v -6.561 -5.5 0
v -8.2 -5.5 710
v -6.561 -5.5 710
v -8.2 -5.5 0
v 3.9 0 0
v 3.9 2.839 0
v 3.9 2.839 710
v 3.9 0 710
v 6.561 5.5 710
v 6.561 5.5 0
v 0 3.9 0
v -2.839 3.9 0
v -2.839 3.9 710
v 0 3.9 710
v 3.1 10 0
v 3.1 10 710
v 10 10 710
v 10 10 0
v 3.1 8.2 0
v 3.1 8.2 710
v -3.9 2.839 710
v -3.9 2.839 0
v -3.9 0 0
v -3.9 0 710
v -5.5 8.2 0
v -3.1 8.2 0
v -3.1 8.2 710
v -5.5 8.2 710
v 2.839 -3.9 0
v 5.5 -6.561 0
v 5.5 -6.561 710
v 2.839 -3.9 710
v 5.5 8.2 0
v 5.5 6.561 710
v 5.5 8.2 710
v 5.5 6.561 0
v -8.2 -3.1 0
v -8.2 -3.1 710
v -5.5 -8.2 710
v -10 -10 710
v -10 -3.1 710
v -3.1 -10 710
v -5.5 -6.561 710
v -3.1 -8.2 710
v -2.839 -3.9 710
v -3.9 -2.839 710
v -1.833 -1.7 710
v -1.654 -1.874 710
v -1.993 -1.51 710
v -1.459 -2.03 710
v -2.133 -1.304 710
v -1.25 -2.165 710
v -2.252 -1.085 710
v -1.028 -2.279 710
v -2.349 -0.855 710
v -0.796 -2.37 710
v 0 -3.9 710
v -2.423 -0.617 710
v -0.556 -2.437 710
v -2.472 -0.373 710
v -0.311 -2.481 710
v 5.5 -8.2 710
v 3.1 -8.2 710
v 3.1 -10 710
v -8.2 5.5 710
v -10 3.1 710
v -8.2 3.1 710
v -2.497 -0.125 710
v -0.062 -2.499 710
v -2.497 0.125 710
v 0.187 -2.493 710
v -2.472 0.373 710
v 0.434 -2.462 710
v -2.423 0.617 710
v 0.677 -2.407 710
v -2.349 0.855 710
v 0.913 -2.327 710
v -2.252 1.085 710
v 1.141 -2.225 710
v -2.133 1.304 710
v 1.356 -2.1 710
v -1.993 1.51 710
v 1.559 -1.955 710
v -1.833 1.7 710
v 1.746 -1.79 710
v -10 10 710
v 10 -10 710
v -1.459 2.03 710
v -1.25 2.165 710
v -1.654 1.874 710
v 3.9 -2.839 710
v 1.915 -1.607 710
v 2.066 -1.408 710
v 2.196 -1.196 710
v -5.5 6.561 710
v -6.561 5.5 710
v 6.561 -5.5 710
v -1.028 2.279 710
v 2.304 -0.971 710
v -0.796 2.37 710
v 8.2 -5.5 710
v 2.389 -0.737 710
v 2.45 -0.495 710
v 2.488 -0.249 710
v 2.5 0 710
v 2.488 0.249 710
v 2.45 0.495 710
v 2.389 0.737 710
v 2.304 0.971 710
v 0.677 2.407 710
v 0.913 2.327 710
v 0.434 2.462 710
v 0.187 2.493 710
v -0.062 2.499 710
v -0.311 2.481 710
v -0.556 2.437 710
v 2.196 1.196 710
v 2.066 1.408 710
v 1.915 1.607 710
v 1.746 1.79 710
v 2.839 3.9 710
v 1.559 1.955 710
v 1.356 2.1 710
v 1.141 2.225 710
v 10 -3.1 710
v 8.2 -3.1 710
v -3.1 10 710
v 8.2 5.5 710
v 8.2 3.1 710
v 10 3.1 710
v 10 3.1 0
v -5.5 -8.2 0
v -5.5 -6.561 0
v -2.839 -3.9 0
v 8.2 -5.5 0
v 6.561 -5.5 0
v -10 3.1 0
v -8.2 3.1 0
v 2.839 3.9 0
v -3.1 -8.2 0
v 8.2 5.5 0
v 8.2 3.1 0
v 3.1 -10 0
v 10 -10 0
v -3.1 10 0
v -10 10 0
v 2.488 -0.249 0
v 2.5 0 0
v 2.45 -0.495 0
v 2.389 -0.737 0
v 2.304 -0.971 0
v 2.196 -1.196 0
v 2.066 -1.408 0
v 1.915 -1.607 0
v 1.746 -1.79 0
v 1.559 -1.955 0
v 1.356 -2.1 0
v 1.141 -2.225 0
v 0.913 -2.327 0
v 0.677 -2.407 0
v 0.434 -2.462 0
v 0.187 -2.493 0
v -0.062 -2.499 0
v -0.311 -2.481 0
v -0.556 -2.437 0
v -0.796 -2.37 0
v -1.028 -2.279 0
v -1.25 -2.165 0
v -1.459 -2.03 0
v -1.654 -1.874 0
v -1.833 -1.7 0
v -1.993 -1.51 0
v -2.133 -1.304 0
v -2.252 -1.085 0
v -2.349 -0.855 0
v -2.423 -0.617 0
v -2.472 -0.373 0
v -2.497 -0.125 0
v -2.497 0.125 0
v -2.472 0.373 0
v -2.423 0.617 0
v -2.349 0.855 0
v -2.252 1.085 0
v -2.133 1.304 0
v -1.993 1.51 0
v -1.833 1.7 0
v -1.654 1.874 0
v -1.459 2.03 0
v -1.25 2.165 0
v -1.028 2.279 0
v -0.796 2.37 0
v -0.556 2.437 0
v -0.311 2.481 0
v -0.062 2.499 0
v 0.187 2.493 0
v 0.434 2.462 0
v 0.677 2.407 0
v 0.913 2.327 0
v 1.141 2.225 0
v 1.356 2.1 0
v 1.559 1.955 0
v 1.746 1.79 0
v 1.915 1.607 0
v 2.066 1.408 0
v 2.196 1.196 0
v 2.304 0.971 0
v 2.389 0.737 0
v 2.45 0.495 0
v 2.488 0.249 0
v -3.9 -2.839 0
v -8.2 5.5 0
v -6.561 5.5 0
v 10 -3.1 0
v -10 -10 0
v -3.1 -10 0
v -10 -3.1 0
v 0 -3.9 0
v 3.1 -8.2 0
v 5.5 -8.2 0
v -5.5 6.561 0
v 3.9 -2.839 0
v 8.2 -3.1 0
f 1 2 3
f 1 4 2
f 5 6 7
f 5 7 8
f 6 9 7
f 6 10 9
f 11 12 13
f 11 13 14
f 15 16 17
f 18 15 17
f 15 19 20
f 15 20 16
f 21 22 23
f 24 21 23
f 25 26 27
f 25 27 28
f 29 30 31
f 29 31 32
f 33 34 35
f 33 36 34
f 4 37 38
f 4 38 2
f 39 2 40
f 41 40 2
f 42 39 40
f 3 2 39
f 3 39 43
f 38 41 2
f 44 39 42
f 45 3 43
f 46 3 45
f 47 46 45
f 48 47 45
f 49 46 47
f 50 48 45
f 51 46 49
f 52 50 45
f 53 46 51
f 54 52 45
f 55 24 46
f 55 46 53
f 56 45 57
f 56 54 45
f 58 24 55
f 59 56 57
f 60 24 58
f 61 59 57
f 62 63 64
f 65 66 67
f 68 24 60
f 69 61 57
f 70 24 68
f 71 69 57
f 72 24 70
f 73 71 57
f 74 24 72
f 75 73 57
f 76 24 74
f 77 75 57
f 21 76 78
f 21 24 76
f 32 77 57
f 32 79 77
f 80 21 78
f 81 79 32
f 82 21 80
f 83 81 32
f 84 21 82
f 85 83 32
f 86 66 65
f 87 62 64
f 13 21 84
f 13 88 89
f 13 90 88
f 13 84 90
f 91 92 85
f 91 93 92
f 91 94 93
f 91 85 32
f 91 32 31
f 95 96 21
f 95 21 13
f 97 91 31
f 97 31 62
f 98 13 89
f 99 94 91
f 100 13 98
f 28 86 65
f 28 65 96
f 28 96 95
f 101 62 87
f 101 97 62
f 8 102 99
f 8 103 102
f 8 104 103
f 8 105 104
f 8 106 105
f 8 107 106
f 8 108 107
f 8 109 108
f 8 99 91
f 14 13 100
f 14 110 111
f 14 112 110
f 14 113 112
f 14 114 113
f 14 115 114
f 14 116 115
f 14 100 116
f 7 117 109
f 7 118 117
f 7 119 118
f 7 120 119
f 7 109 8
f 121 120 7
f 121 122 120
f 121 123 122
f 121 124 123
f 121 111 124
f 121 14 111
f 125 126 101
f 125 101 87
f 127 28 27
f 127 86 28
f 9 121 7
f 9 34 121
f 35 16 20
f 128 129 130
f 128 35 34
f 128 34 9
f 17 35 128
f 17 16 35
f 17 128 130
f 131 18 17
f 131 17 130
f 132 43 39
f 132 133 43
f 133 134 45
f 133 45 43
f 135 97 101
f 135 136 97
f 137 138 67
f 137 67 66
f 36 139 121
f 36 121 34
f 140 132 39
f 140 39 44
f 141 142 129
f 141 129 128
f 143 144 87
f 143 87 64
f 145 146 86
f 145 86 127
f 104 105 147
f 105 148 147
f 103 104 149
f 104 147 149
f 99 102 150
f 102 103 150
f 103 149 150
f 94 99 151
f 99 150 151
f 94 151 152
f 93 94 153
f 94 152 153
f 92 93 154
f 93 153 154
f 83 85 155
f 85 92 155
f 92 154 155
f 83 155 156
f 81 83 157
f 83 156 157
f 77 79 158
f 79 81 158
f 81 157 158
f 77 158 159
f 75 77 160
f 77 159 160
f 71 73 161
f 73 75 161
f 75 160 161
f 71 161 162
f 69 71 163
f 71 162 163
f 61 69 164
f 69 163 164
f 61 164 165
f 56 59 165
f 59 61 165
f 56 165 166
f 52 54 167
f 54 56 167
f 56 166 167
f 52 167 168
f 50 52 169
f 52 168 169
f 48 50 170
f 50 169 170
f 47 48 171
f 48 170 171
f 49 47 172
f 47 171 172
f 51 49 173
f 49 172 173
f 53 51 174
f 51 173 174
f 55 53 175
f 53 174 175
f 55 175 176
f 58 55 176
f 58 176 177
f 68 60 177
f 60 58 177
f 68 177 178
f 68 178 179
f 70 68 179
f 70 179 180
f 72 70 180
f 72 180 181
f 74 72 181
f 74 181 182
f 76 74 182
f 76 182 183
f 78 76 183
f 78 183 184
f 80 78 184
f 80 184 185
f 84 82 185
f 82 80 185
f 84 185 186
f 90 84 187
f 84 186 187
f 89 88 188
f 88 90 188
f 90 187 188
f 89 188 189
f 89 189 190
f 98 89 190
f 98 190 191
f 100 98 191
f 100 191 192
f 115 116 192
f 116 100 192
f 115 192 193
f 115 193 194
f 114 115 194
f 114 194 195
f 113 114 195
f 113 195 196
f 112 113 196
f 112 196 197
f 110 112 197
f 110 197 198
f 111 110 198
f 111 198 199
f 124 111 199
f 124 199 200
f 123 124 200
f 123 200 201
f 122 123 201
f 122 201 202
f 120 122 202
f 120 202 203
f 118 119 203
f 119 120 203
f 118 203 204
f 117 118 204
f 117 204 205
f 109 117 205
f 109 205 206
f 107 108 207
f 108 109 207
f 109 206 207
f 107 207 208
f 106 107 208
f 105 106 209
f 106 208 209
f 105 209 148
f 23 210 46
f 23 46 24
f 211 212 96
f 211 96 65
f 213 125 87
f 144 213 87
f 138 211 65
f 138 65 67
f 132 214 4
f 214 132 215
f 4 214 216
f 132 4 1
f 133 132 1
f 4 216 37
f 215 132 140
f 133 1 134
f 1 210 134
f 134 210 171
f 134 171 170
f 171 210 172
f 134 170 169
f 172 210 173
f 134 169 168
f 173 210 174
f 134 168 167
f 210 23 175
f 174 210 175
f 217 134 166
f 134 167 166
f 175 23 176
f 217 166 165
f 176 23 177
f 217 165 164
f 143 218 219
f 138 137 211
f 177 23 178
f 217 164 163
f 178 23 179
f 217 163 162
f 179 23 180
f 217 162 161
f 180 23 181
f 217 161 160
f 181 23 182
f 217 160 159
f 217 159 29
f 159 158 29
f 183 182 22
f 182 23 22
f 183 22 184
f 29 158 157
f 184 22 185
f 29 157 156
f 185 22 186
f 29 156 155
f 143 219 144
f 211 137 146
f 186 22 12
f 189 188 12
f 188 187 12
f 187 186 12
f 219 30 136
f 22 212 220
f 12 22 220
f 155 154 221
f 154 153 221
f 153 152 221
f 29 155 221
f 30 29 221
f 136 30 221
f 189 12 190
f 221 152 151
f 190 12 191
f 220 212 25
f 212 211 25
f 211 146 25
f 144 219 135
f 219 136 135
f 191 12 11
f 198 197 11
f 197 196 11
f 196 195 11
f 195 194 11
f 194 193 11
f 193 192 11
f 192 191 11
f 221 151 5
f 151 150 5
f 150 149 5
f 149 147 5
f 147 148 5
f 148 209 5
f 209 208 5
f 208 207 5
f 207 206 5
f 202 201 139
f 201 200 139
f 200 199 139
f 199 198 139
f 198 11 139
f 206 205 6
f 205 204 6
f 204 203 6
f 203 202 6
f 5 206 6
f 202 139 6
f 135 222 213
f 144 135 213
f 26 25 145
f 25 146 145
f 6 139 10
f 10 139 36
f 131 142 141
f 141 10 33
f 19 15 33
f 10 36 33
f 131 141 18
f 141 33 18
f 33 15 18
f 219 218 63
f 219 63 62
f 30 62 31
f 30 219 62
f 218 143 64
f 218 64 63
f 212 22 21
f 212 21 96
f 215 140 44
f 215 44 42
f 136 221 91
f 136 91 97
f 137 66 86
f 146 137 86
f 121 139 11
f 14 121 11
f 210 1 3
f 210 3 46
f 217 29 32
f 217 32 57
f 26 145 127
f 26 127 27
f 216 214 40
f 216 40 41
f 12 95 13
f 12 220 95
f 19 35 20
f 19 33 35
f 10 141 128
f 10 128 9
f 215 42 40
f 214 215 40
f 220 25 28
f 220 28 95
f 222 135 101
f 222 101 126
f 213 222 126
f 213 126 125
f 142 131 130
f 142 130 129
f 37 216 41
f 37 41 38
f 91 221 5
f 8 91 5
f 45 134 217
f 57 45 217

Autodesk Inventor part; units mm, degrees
ref_plane "YZ Plane" through (0, 0, 0) normal (1, 0, 0) x (0, 1, 0)
ref_plane "XZ Plane" through (0, 0, 0) normal (0, 1, 0) x (-1, 0, 0)
ref_plane "XY Plane" through (0, 0, 0) normal (0, 0, 1) x (1, 0, 0)
sketch "Sketch1" plane through (0, 0, 0) normal (0, 0, 1) x (1, 0, 0)
  line L0 (10, -10) -> (-10, -10) construction
  line L1 (-10, -10) -> (-10, 10) construction
  line L2 (-10, 10) -> (10, 10) construction
  line L3 (10, 10) -> (10, -10) construction
  line L4 (-2.8393, -3.9) -> (-5.5, -6.5607)
  line L5 (-5.5, -6.5607) -> (-5.5, -8.2)
  line L6 (-5.5, -8.2) -> (-3.1, -8.2)
  line L7 (-3.1, -8.2) -> (-3.1, -10)
  line L8 (-3.1, -10) -> (-10, -10)
  line L9 (-10, -10) -> (-10, -3.1)
  line L10 (-10, -3.1) -> (-8.2, -3.1)
  line L11 (-8.2, -3.1) -> (-8.2, -5.5)
  line L12 (-8.2, -5.5) -> (-6.5607, -5.5)
  line L13 (-6.5607, -5.5) -> (-3.9, -2.8393)
  line L14 (-2.8393, -3.9) -> (0, -3.9)
  line L15 (-3.9, -2.8393) -> (-3.9, 0)
  line L16 (-3.9, -2.8393) -> (-6.6948, -2.8393) construction
  line L17 (3.9, -2.8393) -> (3.9, 0)
  line L18 (2.8393, -3.9) -> (2.8393, -6.6948) construction
  line L19 (3.9, -2.8393) -> (6.5607, -5.5)
  line L20 (6.5607, -5.5) -> (8.2, -5.5)
  line L21 (5.5, -6.5607) -> (2.8393, -3.9)
  line L22 (5.5, -8.2) -> (5.5, -6.5607)
  line L23 (3.1, -8.2) -> (5.5, -8.2)
  line L24 (3.1, -10) -> (3.1, -8.2)
  line L25 (10, -10) -> (3.1, -10)
  line L26 (10, -3.1) -> (10, -10)
  line L27 (8.2, -3.1) -> (10, -3.1)
  line L28 (8.2, -5.5) -> (8.2, -3.1)
  line L29 (2.8393, -3.9) -> (0, -3.9)
  line L30 (2.8393, 3.9) -> (0, 3.9)
  line L31 (3.9, 2.8393) -> (6.6948, 2.8393) construction
  line L32 (2.8393, 3.9) -> (5.5, 6.5607)
  line L33 (5.5, 6.5607) -> (5.5, 8.2)
  line L34 (6.5607, 5.5) -> (3.9, 2.8393)
  line L35 (8.2, 5.5) -> (6.5607, 5.5)
  line L36 (8.2, 3.1) -> (8.2, 5.5)
  line L37 (10, 3.1) -> (8.2, 3.1)
  line L38 (10, 10) -> (10, 3.1)
  line L39 (3.1, 10) -> (10, 10)
  line L40 (3.1, 8.2) -> (3.1, 10)
  line L41 (5.5, 8.2) -> (3.1, 8.2)
  line L42 (3.9, 2.8393) -> (3.9, 0)
  line L43 (-3.9, 2.8393) -> (-3.9, 0)
  line L44 (-2.8393, 3.9) -> (-2.8393, 6.6948) construction
  line L45 (-3.9, 2.8393) -> (-6.5607, 5.5)
  line L46 (-6.5607, 5.5) -> (-8.2, 5.5)
  line L47 (-5.5, 6.5607) -> (-2.8393, 3.9)
  line L48 (-5.5, 8.2) -> (-5.5, 6.5607)
  line L49 (-3.1, 8.2) -> (-5.5, 8.2)
  line L50 (-3.1, 10) -> (-3.1, 8.2)
  line L51 (-10, 10) -> (-3.1, 10)
  line L52 (-10, 3.1) -> (-10, 10)
  line L53 (-8.2, 3.1) -> (-10, 3.1)
  line L54 (-8.2, 5.5) -> (-8.2, 3.1)
  line L55 (-2.8393, 3.9) -> (0, 3.9)
  circle A0 centre (0, 0) radius 2.5
  point P0 (3.9, 0)
  point P1 (0, 3.9)
  dimension "d0" = 20
  dimension "d1" = 20
  dimension "d2" = 10
  dimension "d3" = 10
  dimension "d4" = 3.1
  dimension "d5" = 5.5
  dimension "d6" = 5.5
  dimension "d7" = 3.1
  dimension "d8" = 1.8
  dimension "d10" = 6.1
  dimension "d11" = 6.1
  dimension "d12" = 45
  dimension "d13" = 1.5
  dimension "d16" = 360
  dimension "d18" = 5
extrude "Extrusion1" add sketch "Sketch1" along normal blind 710
properties part number "2020_710"
